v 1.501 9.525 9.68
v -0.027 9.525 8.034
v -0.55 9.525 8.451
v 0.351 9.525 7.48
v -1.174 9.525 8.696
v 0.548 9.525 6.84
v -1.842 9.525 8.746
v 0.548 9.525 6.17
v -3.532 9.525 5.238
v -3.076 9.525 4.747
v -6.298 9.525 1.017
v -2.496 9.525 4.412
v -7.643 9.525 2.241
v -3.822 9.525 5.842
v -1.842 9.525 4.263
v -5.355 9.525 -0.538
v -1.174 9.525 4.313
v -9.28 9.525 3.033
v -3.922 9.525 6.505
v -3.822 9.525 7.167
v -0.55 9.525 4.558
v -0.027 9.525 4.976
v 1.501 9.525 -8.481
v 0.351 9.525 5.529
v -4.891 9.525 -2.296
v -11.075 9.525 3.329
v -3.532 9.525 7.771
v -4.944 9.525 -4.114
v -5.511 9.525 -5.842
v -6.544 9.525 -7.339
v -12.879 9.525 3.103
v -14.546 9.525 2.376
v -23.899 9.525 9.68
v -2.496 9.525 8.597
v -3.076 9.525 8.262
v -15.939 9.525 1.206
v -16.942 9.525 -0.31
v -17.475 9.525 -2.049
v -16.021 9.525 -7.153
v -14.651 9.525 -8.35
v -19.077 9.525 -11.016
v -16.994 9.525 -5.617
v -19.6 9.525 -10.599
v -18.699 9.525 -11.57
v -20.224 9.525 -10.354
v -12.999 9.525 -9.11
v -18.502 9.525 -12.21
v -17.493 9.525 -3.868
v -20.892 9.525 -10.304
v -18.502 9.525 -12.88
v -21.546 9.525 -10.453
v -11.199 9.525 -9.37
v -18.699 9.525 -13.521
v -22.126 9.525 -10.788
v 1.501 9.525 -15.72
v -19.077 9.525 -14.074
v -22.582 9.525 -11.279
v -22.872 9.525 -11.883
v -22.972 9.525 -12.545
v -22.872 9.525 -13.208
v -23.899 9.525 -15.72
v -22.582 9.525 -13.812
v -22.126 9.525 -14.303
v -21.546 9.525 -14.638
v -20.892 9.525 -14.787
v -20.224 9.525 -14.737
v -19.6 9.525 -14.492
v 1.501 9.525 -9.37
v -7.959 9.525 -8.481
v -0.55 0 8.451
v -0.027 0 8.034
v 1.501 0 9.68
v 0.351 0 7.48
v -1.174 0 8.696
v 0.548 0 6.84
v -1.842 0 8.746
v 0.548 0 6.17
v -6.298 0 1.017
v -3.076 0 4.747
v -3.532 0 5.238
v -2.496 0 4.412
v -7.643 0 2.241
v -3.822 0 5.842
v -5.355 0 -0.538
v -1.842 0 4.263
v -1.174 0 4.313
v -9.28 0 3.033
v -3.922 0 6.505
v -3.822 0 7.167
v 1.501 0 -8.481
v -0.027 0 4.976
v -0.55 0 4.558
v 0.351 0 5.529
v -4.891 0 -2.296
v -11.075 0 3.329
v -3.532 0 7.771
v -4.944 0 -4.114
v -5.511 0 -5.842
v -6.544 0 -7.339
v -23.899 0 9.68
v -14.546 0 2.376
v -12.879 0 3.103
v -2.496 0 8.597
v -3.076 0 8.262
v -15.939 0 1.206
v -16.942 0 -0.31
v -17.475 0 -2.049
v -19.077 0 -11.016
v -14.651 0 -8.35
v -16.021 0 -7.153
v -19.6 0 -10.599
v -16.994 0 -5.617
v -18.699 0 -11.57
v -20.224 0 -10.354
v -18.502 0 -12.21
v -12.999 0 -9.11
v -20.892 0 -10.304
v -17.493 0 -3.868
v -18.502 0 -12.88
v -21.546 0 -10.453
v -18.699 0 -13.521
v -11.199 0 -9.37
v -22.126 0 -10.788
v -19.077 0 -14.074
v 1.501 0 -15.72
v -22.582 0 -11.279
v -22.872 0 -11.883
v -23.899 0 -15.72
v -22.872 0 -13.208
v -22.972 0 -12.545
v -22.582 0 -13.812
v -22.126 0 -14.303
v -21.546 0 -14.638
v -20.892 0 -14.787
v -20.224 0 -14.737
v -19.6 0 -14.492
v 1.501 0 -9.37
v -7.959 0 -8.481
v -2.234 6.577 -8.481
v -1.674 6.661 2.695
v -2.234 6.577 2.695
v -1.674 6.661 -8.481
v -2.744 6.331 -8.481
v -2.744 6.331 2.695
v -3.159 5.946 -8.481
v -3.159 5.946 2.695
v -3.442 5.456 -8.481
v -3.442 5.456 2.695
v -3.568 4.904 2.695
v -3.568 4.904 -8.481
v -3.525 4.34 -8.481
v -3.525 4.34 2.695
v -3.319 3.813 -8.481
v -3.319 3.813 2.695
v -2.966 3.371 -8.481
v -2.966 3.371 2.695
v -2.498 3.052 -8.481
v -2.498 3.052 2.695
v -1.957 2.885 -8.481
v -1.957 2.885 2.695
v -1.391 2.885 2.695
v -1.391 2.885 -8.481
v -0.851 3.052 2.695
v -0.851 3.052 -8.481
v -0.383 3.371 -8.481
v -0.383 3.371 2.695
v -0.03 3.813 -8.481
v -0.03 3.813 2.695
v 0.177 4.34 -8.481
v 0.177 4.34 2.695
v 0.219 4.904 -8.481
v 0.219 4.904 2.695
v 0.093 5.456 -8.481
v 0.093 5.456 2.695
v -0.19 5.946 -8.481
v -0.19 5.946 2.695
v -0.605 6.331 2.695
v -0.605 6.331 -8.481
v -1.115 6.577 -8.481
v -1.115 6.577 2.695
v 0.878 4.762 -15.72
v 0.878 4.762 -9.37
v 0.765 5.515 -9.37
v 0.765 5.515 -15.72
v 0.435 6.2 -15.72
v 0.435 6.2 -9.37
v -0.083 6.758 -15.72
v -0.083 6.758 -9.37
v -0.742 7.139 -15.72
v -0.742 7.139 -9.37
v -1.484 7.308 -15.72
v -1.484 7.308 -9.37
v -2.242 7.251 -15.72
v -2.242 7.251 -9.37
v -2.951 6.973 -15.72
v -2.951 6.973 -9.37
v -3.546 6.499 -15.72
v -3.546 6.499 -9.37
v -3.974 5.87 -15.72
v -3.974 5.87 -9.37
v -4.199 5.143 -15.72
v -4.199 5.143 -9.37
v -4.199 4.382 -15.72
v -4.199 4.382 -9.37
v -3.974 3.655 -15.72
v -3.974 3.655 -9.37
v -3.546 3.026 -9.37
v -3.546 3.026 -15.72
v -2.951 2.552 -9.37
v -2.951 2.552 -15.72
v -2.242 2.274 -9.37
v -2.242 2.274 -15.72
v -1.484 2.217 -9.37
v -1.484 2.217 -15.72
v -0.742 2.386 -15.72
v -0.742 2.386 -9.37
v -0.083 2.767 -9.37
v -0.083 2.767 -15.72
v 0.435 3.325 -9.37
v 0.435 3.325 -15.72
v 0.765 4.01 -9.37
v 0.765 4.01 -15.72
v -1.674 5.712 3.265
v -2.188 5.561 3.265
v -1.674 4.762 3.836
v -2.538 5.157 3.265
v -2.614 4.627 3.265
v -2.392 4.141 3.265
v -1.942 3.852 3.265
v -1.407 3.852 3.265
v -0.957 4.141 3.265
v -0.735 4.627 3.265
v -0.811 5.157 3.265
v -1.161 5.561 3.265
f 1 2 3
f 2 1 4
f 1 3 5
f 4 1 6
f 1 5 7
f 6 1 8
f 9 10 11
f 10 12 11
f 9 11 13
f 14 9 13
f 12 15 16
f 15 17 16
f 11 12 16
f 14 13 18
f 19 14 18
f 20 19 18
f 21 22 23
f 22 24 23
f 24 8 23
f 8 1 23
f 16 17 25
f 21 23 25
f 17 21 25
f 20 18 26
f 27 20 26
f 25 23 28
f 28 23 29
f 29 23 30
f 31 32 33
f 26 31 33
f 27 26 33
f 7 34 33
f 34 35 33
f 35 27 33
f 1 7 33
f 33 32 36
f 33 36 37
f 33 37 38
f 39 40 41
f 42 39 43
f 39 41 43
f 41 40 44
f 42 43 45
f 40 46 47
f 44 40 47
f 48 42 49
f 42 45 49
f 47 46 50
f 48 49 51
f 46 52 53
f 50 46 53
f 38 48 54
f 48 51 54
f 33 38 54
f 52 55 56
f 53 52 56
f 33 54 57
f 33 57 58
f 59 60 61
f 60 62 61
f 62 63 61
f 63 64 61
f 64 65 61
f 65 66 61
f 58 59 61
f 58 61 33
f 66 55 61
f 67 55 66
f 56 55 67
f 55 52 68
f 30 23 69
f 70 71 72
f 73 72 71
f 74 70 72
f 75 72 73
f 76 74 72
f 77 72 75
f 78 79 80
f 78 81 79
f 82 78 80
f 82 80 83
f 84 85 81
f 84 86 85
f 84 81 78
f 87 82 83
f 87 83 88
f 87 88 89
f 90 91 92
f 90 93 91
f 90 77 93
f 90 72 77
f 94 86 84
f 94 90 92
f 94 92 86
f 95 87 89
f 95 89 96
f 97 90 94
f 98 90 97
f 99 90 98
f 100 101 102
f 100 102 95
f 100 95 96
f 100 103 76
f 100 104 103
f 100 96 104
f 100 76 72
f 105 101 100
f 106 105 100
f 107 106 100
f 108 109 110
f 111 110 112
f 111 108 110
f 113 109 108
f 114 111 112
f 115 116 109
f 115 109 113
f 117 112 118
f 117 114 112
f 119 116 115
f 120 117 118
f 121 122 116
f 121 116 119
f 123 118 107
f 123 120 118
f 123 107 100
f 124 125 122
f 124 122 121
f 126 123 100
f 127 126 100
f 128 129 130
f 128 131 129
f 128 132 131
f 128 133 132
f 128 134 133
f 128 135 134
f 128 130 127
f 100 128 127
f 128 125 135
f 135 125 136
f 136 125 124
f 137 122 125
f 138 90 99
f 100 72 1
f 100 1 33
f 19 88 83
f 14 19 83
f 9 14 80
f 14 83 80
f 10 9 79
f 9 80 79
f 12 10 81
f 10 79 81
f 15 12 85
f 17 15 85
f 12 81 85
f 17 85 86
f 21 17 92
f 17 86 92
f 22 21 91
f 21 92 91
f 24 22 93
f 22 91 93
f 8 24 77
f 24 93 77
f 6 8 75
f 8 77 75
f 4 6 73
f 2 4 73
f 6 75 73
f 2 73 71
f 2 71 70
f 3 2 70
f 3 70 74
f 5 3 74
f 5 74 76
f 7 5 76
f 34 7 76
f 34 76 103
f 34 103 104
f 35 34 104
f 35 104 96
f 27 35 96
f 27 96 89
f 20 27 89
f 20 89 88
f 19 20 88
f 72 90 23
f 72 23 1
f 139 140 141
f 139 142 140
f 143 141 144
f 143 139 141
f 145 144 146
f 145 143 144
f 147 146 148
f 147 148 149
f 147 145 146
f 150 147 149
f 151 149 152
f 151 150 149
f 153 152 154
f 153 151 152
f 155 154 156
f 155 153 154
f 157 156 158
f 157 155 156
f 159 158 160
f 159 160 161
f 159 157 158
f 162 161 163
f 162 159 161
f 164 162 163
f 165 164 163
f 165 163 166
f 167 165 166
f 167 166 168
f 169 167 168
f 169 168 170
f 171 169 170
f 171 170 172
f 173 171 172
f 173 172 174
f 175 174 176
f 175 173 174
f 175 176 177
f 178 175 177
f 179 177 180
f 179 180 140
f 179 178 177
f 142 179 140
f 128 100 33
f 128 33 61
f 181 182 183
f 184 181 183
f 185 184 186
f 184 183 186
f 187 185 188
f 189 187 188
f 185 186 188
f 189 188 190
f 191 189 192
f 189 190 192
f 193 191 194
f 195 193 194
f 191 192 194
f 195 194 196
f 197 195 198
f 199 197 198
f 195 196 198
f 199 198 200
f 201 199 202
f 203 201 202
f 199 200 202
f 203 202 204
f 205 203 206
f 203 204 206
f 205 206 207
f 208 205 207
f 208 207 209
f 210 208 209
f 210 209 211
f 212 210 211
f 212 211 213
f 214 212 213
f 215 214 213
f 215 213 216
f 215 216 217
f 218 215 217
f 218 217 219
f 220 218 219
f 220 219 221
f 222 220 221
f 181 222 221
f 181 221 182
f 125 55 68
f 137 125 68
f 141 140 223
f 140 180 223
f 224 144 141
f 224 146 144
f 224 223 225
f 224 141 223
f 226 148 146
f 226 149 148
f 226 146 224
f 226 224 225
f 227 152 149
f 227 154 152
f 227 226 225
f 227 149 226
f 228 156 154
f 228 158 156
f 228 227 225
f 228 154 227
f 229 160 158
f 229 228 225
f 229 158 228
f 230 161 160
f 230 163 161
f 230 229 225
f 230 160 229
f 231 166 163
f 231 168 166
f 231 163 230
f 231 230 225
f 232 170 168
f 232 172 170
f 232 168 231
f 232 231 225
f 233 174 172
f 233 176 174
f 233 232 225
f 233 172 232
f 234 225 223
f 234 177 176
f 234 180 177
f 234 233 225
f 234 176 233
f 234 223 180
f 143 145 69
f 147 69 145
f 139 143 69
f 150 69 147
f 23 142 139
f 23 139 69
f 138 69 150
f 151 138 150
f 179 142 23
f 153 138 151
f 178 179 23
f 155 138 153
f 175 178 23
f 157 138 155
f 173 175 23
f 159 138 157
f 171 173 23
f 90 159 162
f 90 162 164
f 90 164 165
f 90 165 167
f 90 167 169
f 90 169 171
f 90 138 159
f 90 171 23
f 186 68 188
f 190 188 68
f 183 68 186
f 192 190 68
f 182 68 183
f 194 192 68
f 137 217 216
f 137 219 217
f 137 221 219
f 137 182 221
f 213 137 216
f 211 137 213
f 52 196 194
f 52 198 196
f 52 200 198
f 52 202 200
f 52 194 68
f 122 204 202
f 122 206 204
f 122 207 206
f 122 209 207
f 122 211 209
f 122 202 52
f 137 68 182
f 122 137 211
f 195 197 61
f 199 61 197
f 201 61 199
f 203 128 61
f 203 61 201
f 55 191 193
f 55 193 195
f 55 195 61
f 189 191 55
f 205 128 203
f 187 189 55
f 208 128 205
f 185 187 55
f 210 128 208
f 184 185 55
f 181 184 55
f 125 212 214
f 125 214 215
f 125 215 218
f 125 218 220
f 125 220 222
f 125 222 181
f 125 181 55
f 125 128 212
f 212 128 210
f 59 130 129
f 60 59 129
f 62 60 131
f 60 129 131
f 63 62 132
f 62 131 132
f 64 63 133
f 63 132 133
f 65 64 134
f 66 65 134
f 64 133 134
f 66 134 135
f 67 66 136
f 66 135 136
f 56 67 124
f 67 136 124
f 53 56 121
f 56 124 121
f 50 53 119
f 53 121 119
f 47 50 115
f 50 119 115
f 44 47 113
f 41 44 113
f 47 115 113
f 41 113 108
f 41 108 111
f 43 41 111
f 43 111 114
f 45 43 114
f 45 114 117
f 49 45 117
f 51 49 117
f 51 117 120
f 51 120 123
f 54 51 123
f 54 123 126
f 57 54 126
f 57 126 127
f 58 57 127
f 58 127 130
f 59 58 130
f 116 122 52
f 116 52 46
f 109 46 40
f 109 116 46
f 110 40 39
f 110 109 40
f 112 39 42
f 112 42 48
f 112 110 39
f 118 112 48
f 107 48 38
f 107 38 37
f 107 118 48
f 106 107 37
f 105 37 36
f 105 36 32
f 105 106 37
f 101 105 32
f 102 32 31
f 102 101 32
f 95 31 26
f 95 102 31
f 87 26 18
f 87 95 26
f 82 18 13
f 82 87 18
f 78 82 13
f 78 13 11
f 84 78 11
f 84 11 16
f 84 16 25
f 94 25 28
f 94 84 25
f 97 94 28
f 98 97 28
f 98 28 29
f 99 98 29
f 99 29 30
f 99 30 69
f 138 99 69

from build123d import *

# Parameters (mm, degrees)
BOSS_EXTRUDE1_DEPTH        = 9.525
F_8_CLEARANCE_HOLE1_D      = 4.4958
F_10_CLEARANCE_HOLE1_D     = 5.1054
F_10_CLEARANCE_HOLE1_DEPTH = 6.35


with BuildPart() as part:
    # Sketch1 → Boss-Extrude1 (new body)
    with BuildSketch(Plane(origin=(0, 0, 0), x_dir=(1, 0, 0), z_dir=(0, 1, 0))):
        with BuildLine():
            Line((1.500621967, 8.481252019), (1.500621967, -9.679747981))
            Line((1.500621967, -9.679747981), (-23.899378033, -9.679747981))
            Line((-23.899378033, -9.679747981), (-23.899378033, 15.720252019))
            Line((-23.899378033, 15.720252019), (1.500621967, 15.720252019))
            Line((1.500621967, 15.720252019), (1.500621967, 9.370252019))
            Line((1.500621967, 9.370252019), (-11.199378033, 9.370252019))
            ThreePointArc((-11.199378033, 9.370252019), (-12.879430115, -3.103466214), (-7.959010924, 8.481252019))
            Line((-7.959010924, 8.481252019), (1.500621967, 8.481252019))
        make_face()
    extrude(amount=BOSS_EXTRUDE1_DEPTH)

    # #8 Clearance Hole1 (through all)
    with Locations(Plane(origin=(0, 9.525, 0), x_dir=(1, 0, 0), z_dir=(0, 1, 0))):
        with Locations((-20.724378033, 12.545252019), (-1.674378033, -6.504747981)):
            Hole(F_8_CLEARANCE_HOLE1_D / 2)

    # Sketch4 → #10-24 Tapped Hole1 (revolve, cut)
    with BuildSketch(Plane(origin=(-1.674378033, 4.7625, -8.481252019), x_dir=(0, 1, 0), z_dir=(1, 0, 0))):
        Polygon((0, 0), (0, 12.316824014), (1.89865, 11.176), (1.89865, 0), align=None)
    revolve(axis=Axis((-1.674378033, 4.7625, -14.831252019), (0, 0, 1)), mode=Mode.SUBTRACT)

    # #10 Clearance Hole1
    with Locations(Plane(origin=(0, 0, -15.720252019), x_dir=(-1, 0, 0), z_dir=(0, 0, -1))):
        with Locations((1.674378033, 4.7625)):
            Hole(F_10_CLEARANCE_HOLE1_D / 2, depth=F_10_CLEARANCE_HOLE1_DEPTH)


solid = part.part
